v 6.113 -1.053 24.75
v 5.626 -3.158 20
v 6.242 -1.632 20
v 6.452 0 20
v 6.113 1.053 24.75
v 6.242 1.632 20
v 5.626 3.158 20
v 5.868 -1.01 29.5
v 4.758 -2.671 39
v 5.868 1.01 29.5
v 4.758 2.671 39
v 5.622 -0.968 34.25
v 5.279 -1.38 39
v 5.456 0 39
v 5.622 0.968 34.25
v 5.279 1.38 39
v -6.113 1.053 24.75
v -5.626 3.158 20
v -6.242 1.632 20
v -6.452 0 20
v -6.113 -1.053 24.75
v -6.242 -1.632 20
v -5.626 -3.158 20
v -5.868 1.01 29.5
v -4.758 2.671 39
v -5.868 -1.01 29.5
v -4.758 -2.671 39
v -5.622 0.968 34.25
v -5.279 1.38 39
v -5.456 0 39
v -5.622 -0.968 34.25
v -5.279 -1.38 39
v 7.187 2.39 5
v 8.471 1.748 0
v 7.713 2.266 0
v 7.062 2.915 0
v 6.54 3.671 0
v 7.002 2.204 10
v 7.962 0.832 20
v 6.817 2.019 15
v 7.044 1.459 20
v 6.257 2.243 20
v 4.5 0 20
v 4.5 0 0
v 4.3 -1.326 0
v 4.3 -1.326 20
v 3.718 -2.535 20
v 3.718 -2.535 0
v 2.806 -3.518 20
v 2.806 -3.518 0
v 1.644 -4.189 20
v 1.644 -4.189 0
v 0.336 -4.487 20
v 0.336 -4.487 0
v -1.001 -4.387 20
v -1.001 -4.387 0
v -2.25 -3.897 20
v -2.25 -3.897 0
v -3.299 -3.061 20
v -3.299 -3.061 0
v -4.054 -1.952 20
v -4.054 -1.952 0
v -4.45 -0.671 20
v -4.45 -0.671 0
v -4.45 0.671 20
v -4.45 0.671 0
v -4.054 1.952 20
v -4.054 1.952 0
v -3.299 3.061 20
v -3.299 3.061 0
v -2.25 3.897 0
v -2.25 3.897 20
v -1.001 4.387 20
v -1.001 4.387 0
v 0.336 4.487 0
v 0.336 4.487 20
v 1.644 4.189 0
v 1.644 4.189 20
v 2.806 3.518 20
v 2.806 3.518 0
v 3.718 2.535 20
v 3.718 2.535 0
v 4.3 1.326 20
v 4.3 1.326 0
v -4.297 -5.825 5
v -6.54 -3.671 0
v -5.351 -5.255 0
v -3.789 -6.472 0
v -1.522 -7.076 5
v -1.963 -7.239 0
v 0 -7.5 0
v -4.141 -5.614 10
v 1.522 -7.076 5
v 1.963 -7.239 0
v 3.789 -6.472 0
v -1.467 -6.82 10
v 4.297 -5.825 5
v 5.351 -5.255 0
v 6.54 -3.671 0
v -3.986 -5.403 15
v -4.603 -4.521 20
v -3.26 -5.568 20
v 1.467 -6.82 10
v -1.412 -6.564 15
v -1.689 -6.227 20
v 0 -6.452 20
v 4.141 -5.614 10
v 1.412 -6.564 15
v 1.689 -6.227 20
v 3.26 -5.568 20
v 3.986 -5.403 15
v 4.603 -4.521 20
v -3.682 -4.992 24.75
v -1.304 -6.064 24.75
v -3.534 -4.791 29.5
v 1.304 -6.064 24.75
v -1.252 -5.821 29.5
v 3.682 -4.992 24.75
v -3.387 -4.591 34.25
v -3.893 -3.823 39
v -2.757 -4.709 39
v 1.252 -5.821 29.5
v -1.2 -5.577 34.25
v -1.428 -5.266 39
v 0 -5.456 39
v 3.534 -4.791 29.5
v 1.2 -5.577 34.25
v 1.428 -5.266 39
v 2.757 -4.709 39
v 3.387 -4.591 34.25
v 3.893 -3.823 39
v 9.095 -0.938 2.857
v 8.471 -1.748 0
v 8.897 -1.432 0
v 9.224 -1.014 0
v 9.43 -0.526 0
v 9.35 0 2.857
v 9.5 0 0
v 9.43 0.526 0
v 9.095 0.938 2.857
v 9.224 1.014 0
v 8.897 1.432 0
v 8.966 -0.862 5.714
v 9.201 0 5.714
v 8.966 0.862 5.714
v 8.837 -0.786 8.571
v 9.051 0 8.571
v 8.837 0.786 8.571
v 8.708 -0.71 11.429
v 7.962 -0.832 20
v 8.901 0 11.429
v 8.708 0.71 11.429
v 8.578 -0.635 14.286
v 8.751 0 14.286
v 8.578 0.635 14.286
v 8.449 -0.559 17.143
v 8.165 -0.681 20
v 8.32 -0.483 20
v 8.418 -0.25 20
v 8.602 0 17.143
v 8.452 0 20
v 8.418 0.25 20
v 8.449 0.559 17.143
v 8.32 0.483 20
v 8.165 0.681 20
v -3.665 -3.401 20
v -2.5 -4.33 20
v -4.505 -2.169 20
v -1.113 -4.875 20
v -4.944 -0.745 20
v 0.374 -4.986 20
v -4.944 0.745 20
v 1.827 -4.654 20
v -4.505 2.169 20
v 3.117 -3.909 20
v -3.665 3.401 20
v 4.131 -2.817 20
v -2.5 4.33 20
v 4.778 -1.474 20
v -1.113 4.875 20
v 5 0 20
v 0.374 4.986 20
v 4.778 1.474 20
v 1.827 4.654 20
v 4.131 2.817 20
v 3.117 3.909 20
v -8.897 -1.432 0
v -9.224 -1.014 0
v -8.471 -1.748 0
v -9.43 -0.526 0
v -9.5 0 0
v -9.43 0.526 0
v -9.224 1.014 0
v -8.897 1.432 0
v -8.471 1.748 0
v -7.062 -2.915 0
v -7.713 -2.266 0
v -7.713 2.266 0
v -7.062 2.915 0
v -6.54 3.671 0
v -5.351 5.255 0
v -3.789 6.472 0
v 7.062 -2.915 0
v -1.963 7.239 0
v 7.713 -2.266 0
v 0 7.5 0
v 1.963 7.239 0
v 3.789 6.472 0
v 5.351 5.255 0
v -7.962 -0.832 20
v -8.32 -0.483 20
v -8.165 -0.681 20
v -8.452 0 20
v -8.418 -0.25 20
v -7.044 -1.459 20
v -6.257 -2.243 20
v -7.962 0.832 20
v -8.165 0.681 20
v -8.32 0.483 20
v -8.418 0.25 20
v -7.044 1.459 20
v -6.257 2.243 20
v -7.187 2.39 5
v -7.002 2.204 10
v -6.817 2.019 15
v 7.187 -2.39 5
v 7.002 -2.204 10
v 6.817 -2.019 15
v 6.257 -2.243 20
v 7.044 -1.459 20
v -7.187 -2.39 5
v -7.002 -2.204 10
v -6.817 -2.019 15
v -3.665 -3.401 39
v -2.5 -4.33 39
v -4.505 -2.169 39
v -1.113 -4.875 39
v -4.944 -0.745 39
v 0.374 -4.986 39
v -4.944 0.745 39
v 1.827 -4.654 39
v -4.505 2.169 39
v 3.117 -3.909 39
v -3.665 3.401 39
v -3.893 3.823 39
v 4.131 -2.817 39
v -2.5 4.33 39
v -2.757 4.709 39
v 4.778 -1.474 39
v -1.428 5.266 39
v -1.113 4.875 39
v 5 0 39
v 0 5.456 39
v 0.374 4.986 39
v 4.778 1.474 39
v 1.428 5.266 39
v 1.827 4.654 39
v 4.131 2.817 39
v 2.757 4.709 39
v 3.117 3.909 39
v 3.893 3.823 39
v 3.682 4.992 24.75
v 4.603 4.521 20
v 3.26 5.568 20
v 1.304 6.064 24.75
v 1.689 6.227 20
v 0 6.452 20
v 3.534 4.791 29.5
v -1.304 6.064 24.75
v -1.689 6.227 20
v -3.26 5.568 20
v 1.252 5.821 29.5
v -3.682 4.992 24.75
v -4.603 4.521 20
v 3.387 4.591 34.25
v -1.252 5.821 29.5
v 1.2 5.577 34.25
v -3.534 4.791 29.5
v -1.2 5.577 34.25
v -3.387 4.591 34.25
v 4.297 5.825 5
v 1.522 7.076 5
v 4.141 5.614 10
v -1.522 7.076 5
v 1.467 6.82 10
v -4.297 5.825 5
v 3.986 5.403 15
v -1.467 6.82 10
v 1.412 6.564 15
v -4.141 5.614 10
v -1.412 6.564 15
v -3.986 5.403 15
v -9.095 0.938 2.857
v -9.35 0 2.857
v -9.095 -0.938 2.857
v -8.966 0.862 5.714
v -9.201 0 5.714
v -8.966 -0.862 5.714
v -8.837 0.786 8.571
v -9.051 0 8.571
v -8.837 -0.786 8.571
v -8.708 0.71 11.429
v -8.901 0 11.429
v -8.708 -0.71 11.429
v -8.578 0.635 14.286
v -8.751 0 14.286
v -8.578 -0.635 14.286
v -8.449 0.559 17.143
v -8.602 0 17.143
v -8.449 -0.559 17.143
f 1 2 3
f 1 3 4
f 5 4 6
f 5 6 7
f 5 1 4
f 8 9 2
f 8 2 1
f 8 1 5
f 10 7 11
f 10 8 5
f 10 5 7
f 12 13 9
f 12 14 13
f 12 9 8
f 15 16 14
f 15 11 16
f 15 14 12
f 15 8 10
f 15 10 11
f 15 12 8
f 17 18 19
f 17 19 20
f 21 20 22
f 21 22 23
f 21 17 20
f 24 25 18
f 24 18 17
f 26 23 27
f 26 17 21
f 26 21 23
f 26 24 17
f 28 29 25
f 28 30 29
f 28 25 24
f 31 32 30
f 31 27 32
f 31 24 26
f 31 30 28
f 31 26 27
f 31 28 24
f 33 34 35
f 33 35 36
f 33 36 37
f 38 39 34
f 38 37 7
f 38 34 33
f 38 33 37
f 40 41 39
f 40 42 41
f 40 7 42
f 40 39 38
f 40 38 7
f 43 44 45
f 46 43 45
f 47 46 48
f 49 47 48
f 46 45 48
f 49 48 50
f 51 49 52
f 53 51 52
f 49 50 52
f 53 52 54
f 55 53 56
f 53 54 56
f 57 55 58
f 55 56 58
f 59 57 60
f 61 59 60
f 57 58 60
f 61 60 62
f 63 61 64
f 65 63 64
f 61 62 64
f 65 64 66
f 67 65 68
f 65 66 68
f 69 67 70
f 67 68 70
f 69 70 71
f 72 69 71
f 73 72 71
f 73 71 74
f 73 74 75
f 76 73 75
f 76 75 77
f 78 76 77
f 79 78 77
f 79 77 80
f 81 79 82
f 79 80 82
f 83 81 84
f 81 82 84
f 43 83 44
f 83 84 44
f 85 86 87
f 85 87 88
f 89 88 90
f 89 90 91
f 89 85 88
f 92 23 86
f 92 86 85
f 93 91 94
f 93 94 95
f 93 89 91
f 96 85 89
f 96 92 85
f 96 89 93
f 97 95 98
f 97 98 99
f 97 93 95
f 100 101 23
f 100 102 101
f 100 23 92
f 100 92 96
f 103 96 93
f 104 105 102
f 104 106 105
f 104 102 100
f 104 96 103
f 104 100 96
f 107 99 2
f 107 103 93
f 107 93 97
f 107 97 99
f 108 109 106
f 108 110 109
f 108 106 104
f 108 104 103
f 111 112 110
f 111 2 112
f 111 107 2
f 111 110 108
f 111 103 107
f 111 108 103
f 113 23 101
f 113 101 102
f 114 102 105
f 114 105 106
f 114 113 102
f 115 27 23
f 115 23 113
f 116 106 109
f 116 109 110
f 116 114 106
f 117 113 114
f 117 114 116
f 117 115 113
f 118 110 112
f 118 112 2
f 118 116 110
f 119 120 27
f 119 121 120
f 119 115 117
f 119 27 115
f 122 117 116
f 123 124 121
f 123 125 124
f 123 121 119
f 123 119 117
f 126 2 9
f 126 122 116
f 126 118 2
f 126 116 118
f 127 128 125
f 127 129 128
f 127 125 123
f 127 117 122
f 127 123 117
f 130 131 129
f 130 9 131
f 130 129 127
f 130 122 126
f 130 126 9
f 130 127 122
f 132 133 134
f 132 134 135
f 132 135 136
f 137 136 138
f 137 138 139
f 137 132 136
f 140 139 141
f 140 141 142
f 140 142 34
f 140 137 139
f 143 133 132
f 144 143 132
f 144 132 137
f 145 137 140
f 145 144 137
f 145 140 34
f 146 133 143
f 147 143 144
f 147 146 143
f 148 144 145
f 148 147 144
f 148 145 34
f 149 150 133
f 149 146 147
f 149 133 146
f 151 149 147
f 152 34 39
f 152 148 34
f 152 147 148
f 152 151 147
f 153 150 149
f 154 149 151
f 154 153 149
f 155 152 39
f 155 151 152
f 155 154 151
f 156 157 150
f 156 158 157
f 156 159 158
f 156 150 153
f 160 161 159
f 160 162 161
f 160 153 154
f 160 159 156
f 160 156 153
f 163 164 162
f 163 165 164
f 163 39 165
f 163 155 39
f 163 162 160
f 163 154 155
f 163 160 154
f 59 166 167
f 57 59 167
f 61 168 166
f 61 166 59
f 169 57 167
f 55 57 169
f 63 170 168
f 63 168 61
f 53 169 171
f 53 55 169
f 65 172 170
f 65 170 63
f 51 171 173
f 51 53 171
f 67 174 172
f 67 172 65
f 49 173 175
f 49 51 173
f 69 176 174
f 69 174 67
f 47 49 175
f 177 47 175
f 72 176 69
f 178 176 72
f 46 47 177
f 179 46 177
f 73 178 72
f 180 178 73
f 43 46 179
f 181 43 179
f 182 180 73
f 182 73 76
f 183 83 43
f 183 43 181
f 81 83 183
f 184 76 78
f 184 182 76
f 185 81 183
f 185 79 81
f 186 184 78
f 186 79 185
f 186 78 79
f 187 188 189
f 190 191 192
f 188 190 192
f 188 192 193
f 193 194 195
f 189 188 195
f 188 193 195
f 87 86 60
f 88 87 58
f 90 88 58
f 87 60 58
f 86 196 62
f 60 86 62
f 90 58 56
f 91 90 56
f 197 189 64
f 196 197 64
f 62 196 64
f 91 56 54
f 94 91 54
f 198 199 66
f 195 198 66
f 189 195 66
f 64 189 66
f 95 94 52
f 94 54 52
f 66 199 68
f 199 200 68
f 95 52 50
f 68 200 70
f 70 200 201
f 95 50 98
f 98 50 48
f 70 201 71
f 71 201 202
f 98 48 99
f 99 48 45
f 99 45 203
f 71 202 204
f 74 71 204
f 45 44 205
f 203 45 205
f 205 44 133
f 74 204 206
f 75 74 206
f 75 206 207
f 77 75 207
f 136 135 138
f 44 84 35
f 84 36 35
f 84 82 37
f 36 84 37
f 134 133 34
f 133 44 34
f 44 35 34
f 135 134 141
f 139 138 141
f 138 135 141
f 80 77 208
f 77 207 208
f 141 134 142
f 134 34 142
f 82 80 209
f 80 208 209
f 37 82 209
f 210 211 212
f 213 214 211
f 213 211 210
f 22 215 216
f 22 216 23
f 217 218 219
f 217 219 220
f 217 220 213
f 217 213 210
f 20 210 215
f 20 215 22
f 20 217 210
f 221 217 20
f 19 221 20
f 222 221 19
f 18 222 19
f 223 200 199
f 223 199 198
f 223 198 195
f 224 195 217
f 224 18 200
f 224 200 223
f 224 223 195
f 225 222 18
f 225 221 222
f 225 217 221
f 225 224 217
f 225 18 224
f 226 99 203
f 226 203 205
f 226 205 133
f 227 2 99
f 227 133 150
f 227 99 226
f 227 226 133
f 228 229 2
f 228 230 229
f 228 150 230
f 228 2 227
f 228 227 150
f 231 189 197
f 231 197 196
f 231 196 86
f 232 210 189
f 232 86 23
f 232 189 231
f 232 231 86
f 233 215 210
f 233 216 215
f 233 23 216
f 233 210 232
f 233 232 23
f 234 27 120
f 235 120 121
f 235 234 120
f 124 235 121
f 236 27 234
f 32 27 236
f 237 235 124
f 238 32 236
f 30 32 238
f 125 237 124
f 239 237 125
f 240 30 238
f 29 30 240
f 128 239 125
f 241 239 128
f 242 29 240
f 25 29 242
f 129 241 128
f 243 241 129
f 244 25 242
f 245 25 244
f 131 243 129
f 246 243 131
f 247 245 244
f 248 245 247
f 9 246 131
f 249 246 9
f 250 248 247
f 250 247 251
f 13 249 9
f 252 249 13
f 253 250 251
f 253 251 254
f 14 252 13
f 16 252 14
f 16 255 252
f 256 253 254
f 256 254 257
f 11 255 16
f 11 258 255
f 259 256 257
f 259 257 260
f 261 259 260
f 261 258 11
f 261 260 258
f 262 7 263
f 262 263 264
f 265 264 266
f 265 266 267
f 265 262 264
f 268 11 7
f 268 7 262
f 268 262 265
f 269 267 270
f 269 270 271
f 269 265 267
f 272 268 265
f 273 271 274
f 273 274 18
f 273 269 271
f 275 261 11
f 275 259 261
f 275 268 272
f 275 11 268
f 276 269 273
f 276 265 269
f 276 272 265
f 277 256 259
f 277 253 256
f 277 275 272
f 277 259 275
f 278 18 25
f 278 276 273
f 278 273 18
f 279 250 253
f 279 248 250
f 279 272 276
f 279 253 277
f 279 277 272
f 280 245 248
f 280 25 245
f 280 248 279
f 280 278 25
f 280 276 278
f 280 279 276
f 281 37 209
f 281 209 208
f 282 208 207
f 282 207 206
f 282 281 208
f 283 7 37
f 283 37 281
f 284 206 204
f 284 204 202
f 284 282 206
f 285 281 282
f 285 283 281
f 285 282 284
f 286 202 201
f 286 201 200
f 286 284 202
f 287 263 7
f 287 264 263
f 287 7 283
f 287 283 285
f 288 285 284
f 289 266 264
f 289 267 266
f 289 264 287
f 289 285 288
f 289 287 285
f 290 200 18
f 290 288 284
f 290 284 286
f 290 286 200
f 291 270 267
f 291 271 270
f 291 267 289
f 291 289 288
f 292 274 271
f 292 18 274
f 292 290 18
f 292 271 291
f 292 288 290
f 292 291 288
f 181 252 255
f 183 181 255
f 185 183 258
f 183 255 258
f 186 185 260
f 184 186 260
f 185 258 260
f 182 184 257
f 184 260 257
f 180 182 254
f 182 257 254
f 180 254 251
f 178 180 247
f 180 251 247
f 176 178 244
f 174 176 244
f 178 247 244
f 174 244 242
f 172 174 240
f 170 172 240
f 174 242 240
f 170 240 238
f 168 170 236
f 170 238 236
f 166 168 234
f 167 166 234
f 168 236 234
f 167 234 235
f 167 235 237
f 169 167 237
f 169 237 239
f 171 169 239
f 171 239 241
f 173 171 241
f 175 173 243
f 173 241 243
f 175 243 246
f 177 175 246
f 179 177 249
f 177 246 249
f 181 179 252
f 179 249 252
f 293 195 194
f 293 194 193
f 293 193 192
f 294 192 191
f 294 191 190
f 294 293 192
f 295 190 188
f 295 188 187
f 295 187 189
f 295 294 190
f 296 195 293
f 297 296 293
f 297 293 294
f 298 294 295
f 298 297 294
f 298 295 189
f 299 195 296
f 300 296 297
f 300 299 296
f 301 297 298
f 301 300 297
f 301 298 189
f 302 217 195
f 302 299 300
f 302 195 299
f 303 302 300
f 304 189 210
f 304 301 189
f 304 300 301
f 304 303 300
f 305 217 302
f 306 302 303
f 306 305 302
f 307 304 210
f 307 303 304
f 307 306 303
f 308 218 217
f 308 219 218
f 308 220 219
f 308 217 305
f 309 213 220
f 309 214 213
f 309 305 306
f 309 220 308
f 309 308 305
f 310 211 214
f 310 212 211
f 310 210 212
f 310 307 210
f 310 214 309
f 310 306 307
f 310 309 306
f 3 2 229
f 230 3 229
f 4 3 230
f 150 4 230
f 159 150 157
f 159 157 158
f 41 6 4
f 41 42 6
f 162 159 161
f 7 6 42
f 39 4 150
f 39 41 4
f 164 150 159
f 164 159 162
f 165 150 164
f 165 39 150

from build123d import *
from build123d import SkipClean  # not in build123d's __all__

# Parameters (mm, degrees)
F1_DEPTH = 20
F1_TAPER = 3
F3_DEPTH = 19
F3_TAPER = 3
F4_R     = 5
F5_DEPTH = 19
F6_R     = 4.5
F7_DEPTH = 20


with BuildPart() as f1:
    # F0 (on Top) → F1 (new body)
    with BuildSketch(Plane.XY):
        with BuildLine():
            ThreePointArc((-8.4714285714, -1.7482352618), (-7.3721516068, -2.5756206682), (-6.54, -3.6712940498))
            ThreePointArc((-6.54, -3.6712940498), (0, -7.5), (6.54, -3.6712940498))
            ThreePointArc((6.54, -3.6712940498), (7.3721516068, -2.5756206682), (8.4714285714, -1.7482352618))
            ThreePointArc((8.4714285714, -1.7482352618), (9.5, 0), (8.4714285714, 1.7482352618))
            ThreePointArc((8.4714285714, 1.7482352618), (7.3721516068, 2.5756206682), (6.54, 3.6712940498))
            ThreePointArc((6.54, 3.6712940498), (0, 7.5), (-6.54, 3.6712940498))
            ThreePointArc((-6.54, 3.6712940498), (-7.3721516068, 2.5756206682), (-8.4714285714, 1.7482352618))
            ThreePointArc((-8.4714285714, 1.7482352618), (-9.5, 0), (-8.4714285714, -1.7482352618))
        make_face()
    extrude(amount=F1_DEPTH, taper=F1_TAPER)

    # F2 (on face) → F3 (join)
    with BuildSketch(Plane.XY.offset(20)):
        with BuildLine():
            ThreePointArc((-5.6260083293, 3.1582157345), (-6.4518444143, 0), (-5.6260083293, -3.1582157345))
            ThreePointArc((-5.6260083293, -3.1582157345), (0, -6.4518444143), (5.6260083293, -3.1582157345))
            ThreePointArc((5.6260083293, -3.1582157345), (6.4518444143, 0), (5.6260083293, 3.1582157345))
            ThreePointArc((5.6260083293, 3.1582157345), (0, 6.4518444143), (-5.6260083293, 3.1582157345))
        make_face()
    with SkipClean():  # cleaning this boolean's faces spoils the solid; the shape is the same uncleaned
        extrude(amount=F3_DEPTH, taper=F3_TAPER)

    # F4 (on face) → F5 (cut)
    with BuildSketch(Plane.XY.offset(39)):
        Circle(F4_R)
    with SkipClean():  # cleaning this boolean's faces spoils the solid; the shape is the same uncleaned
        extrude(amount=-F5_DEPTH, mode=Mode.SUBTRACT)

    # F6 (on face) → F7 (cut, through all)
    with BuildSketch(Plane(origin=(0, 0, 0), x_dir=(1, 0, 0), z_dir=(0, 0, -1))):
        Circle(F6_R)
    with SkipClean():  # cleaning this boolean's faces spoils the solid; the shape is the same uncleaned
        extrude(amount=-F7_DEPTH, mode=Mode.SUBTRACT)


solid = f1.part
